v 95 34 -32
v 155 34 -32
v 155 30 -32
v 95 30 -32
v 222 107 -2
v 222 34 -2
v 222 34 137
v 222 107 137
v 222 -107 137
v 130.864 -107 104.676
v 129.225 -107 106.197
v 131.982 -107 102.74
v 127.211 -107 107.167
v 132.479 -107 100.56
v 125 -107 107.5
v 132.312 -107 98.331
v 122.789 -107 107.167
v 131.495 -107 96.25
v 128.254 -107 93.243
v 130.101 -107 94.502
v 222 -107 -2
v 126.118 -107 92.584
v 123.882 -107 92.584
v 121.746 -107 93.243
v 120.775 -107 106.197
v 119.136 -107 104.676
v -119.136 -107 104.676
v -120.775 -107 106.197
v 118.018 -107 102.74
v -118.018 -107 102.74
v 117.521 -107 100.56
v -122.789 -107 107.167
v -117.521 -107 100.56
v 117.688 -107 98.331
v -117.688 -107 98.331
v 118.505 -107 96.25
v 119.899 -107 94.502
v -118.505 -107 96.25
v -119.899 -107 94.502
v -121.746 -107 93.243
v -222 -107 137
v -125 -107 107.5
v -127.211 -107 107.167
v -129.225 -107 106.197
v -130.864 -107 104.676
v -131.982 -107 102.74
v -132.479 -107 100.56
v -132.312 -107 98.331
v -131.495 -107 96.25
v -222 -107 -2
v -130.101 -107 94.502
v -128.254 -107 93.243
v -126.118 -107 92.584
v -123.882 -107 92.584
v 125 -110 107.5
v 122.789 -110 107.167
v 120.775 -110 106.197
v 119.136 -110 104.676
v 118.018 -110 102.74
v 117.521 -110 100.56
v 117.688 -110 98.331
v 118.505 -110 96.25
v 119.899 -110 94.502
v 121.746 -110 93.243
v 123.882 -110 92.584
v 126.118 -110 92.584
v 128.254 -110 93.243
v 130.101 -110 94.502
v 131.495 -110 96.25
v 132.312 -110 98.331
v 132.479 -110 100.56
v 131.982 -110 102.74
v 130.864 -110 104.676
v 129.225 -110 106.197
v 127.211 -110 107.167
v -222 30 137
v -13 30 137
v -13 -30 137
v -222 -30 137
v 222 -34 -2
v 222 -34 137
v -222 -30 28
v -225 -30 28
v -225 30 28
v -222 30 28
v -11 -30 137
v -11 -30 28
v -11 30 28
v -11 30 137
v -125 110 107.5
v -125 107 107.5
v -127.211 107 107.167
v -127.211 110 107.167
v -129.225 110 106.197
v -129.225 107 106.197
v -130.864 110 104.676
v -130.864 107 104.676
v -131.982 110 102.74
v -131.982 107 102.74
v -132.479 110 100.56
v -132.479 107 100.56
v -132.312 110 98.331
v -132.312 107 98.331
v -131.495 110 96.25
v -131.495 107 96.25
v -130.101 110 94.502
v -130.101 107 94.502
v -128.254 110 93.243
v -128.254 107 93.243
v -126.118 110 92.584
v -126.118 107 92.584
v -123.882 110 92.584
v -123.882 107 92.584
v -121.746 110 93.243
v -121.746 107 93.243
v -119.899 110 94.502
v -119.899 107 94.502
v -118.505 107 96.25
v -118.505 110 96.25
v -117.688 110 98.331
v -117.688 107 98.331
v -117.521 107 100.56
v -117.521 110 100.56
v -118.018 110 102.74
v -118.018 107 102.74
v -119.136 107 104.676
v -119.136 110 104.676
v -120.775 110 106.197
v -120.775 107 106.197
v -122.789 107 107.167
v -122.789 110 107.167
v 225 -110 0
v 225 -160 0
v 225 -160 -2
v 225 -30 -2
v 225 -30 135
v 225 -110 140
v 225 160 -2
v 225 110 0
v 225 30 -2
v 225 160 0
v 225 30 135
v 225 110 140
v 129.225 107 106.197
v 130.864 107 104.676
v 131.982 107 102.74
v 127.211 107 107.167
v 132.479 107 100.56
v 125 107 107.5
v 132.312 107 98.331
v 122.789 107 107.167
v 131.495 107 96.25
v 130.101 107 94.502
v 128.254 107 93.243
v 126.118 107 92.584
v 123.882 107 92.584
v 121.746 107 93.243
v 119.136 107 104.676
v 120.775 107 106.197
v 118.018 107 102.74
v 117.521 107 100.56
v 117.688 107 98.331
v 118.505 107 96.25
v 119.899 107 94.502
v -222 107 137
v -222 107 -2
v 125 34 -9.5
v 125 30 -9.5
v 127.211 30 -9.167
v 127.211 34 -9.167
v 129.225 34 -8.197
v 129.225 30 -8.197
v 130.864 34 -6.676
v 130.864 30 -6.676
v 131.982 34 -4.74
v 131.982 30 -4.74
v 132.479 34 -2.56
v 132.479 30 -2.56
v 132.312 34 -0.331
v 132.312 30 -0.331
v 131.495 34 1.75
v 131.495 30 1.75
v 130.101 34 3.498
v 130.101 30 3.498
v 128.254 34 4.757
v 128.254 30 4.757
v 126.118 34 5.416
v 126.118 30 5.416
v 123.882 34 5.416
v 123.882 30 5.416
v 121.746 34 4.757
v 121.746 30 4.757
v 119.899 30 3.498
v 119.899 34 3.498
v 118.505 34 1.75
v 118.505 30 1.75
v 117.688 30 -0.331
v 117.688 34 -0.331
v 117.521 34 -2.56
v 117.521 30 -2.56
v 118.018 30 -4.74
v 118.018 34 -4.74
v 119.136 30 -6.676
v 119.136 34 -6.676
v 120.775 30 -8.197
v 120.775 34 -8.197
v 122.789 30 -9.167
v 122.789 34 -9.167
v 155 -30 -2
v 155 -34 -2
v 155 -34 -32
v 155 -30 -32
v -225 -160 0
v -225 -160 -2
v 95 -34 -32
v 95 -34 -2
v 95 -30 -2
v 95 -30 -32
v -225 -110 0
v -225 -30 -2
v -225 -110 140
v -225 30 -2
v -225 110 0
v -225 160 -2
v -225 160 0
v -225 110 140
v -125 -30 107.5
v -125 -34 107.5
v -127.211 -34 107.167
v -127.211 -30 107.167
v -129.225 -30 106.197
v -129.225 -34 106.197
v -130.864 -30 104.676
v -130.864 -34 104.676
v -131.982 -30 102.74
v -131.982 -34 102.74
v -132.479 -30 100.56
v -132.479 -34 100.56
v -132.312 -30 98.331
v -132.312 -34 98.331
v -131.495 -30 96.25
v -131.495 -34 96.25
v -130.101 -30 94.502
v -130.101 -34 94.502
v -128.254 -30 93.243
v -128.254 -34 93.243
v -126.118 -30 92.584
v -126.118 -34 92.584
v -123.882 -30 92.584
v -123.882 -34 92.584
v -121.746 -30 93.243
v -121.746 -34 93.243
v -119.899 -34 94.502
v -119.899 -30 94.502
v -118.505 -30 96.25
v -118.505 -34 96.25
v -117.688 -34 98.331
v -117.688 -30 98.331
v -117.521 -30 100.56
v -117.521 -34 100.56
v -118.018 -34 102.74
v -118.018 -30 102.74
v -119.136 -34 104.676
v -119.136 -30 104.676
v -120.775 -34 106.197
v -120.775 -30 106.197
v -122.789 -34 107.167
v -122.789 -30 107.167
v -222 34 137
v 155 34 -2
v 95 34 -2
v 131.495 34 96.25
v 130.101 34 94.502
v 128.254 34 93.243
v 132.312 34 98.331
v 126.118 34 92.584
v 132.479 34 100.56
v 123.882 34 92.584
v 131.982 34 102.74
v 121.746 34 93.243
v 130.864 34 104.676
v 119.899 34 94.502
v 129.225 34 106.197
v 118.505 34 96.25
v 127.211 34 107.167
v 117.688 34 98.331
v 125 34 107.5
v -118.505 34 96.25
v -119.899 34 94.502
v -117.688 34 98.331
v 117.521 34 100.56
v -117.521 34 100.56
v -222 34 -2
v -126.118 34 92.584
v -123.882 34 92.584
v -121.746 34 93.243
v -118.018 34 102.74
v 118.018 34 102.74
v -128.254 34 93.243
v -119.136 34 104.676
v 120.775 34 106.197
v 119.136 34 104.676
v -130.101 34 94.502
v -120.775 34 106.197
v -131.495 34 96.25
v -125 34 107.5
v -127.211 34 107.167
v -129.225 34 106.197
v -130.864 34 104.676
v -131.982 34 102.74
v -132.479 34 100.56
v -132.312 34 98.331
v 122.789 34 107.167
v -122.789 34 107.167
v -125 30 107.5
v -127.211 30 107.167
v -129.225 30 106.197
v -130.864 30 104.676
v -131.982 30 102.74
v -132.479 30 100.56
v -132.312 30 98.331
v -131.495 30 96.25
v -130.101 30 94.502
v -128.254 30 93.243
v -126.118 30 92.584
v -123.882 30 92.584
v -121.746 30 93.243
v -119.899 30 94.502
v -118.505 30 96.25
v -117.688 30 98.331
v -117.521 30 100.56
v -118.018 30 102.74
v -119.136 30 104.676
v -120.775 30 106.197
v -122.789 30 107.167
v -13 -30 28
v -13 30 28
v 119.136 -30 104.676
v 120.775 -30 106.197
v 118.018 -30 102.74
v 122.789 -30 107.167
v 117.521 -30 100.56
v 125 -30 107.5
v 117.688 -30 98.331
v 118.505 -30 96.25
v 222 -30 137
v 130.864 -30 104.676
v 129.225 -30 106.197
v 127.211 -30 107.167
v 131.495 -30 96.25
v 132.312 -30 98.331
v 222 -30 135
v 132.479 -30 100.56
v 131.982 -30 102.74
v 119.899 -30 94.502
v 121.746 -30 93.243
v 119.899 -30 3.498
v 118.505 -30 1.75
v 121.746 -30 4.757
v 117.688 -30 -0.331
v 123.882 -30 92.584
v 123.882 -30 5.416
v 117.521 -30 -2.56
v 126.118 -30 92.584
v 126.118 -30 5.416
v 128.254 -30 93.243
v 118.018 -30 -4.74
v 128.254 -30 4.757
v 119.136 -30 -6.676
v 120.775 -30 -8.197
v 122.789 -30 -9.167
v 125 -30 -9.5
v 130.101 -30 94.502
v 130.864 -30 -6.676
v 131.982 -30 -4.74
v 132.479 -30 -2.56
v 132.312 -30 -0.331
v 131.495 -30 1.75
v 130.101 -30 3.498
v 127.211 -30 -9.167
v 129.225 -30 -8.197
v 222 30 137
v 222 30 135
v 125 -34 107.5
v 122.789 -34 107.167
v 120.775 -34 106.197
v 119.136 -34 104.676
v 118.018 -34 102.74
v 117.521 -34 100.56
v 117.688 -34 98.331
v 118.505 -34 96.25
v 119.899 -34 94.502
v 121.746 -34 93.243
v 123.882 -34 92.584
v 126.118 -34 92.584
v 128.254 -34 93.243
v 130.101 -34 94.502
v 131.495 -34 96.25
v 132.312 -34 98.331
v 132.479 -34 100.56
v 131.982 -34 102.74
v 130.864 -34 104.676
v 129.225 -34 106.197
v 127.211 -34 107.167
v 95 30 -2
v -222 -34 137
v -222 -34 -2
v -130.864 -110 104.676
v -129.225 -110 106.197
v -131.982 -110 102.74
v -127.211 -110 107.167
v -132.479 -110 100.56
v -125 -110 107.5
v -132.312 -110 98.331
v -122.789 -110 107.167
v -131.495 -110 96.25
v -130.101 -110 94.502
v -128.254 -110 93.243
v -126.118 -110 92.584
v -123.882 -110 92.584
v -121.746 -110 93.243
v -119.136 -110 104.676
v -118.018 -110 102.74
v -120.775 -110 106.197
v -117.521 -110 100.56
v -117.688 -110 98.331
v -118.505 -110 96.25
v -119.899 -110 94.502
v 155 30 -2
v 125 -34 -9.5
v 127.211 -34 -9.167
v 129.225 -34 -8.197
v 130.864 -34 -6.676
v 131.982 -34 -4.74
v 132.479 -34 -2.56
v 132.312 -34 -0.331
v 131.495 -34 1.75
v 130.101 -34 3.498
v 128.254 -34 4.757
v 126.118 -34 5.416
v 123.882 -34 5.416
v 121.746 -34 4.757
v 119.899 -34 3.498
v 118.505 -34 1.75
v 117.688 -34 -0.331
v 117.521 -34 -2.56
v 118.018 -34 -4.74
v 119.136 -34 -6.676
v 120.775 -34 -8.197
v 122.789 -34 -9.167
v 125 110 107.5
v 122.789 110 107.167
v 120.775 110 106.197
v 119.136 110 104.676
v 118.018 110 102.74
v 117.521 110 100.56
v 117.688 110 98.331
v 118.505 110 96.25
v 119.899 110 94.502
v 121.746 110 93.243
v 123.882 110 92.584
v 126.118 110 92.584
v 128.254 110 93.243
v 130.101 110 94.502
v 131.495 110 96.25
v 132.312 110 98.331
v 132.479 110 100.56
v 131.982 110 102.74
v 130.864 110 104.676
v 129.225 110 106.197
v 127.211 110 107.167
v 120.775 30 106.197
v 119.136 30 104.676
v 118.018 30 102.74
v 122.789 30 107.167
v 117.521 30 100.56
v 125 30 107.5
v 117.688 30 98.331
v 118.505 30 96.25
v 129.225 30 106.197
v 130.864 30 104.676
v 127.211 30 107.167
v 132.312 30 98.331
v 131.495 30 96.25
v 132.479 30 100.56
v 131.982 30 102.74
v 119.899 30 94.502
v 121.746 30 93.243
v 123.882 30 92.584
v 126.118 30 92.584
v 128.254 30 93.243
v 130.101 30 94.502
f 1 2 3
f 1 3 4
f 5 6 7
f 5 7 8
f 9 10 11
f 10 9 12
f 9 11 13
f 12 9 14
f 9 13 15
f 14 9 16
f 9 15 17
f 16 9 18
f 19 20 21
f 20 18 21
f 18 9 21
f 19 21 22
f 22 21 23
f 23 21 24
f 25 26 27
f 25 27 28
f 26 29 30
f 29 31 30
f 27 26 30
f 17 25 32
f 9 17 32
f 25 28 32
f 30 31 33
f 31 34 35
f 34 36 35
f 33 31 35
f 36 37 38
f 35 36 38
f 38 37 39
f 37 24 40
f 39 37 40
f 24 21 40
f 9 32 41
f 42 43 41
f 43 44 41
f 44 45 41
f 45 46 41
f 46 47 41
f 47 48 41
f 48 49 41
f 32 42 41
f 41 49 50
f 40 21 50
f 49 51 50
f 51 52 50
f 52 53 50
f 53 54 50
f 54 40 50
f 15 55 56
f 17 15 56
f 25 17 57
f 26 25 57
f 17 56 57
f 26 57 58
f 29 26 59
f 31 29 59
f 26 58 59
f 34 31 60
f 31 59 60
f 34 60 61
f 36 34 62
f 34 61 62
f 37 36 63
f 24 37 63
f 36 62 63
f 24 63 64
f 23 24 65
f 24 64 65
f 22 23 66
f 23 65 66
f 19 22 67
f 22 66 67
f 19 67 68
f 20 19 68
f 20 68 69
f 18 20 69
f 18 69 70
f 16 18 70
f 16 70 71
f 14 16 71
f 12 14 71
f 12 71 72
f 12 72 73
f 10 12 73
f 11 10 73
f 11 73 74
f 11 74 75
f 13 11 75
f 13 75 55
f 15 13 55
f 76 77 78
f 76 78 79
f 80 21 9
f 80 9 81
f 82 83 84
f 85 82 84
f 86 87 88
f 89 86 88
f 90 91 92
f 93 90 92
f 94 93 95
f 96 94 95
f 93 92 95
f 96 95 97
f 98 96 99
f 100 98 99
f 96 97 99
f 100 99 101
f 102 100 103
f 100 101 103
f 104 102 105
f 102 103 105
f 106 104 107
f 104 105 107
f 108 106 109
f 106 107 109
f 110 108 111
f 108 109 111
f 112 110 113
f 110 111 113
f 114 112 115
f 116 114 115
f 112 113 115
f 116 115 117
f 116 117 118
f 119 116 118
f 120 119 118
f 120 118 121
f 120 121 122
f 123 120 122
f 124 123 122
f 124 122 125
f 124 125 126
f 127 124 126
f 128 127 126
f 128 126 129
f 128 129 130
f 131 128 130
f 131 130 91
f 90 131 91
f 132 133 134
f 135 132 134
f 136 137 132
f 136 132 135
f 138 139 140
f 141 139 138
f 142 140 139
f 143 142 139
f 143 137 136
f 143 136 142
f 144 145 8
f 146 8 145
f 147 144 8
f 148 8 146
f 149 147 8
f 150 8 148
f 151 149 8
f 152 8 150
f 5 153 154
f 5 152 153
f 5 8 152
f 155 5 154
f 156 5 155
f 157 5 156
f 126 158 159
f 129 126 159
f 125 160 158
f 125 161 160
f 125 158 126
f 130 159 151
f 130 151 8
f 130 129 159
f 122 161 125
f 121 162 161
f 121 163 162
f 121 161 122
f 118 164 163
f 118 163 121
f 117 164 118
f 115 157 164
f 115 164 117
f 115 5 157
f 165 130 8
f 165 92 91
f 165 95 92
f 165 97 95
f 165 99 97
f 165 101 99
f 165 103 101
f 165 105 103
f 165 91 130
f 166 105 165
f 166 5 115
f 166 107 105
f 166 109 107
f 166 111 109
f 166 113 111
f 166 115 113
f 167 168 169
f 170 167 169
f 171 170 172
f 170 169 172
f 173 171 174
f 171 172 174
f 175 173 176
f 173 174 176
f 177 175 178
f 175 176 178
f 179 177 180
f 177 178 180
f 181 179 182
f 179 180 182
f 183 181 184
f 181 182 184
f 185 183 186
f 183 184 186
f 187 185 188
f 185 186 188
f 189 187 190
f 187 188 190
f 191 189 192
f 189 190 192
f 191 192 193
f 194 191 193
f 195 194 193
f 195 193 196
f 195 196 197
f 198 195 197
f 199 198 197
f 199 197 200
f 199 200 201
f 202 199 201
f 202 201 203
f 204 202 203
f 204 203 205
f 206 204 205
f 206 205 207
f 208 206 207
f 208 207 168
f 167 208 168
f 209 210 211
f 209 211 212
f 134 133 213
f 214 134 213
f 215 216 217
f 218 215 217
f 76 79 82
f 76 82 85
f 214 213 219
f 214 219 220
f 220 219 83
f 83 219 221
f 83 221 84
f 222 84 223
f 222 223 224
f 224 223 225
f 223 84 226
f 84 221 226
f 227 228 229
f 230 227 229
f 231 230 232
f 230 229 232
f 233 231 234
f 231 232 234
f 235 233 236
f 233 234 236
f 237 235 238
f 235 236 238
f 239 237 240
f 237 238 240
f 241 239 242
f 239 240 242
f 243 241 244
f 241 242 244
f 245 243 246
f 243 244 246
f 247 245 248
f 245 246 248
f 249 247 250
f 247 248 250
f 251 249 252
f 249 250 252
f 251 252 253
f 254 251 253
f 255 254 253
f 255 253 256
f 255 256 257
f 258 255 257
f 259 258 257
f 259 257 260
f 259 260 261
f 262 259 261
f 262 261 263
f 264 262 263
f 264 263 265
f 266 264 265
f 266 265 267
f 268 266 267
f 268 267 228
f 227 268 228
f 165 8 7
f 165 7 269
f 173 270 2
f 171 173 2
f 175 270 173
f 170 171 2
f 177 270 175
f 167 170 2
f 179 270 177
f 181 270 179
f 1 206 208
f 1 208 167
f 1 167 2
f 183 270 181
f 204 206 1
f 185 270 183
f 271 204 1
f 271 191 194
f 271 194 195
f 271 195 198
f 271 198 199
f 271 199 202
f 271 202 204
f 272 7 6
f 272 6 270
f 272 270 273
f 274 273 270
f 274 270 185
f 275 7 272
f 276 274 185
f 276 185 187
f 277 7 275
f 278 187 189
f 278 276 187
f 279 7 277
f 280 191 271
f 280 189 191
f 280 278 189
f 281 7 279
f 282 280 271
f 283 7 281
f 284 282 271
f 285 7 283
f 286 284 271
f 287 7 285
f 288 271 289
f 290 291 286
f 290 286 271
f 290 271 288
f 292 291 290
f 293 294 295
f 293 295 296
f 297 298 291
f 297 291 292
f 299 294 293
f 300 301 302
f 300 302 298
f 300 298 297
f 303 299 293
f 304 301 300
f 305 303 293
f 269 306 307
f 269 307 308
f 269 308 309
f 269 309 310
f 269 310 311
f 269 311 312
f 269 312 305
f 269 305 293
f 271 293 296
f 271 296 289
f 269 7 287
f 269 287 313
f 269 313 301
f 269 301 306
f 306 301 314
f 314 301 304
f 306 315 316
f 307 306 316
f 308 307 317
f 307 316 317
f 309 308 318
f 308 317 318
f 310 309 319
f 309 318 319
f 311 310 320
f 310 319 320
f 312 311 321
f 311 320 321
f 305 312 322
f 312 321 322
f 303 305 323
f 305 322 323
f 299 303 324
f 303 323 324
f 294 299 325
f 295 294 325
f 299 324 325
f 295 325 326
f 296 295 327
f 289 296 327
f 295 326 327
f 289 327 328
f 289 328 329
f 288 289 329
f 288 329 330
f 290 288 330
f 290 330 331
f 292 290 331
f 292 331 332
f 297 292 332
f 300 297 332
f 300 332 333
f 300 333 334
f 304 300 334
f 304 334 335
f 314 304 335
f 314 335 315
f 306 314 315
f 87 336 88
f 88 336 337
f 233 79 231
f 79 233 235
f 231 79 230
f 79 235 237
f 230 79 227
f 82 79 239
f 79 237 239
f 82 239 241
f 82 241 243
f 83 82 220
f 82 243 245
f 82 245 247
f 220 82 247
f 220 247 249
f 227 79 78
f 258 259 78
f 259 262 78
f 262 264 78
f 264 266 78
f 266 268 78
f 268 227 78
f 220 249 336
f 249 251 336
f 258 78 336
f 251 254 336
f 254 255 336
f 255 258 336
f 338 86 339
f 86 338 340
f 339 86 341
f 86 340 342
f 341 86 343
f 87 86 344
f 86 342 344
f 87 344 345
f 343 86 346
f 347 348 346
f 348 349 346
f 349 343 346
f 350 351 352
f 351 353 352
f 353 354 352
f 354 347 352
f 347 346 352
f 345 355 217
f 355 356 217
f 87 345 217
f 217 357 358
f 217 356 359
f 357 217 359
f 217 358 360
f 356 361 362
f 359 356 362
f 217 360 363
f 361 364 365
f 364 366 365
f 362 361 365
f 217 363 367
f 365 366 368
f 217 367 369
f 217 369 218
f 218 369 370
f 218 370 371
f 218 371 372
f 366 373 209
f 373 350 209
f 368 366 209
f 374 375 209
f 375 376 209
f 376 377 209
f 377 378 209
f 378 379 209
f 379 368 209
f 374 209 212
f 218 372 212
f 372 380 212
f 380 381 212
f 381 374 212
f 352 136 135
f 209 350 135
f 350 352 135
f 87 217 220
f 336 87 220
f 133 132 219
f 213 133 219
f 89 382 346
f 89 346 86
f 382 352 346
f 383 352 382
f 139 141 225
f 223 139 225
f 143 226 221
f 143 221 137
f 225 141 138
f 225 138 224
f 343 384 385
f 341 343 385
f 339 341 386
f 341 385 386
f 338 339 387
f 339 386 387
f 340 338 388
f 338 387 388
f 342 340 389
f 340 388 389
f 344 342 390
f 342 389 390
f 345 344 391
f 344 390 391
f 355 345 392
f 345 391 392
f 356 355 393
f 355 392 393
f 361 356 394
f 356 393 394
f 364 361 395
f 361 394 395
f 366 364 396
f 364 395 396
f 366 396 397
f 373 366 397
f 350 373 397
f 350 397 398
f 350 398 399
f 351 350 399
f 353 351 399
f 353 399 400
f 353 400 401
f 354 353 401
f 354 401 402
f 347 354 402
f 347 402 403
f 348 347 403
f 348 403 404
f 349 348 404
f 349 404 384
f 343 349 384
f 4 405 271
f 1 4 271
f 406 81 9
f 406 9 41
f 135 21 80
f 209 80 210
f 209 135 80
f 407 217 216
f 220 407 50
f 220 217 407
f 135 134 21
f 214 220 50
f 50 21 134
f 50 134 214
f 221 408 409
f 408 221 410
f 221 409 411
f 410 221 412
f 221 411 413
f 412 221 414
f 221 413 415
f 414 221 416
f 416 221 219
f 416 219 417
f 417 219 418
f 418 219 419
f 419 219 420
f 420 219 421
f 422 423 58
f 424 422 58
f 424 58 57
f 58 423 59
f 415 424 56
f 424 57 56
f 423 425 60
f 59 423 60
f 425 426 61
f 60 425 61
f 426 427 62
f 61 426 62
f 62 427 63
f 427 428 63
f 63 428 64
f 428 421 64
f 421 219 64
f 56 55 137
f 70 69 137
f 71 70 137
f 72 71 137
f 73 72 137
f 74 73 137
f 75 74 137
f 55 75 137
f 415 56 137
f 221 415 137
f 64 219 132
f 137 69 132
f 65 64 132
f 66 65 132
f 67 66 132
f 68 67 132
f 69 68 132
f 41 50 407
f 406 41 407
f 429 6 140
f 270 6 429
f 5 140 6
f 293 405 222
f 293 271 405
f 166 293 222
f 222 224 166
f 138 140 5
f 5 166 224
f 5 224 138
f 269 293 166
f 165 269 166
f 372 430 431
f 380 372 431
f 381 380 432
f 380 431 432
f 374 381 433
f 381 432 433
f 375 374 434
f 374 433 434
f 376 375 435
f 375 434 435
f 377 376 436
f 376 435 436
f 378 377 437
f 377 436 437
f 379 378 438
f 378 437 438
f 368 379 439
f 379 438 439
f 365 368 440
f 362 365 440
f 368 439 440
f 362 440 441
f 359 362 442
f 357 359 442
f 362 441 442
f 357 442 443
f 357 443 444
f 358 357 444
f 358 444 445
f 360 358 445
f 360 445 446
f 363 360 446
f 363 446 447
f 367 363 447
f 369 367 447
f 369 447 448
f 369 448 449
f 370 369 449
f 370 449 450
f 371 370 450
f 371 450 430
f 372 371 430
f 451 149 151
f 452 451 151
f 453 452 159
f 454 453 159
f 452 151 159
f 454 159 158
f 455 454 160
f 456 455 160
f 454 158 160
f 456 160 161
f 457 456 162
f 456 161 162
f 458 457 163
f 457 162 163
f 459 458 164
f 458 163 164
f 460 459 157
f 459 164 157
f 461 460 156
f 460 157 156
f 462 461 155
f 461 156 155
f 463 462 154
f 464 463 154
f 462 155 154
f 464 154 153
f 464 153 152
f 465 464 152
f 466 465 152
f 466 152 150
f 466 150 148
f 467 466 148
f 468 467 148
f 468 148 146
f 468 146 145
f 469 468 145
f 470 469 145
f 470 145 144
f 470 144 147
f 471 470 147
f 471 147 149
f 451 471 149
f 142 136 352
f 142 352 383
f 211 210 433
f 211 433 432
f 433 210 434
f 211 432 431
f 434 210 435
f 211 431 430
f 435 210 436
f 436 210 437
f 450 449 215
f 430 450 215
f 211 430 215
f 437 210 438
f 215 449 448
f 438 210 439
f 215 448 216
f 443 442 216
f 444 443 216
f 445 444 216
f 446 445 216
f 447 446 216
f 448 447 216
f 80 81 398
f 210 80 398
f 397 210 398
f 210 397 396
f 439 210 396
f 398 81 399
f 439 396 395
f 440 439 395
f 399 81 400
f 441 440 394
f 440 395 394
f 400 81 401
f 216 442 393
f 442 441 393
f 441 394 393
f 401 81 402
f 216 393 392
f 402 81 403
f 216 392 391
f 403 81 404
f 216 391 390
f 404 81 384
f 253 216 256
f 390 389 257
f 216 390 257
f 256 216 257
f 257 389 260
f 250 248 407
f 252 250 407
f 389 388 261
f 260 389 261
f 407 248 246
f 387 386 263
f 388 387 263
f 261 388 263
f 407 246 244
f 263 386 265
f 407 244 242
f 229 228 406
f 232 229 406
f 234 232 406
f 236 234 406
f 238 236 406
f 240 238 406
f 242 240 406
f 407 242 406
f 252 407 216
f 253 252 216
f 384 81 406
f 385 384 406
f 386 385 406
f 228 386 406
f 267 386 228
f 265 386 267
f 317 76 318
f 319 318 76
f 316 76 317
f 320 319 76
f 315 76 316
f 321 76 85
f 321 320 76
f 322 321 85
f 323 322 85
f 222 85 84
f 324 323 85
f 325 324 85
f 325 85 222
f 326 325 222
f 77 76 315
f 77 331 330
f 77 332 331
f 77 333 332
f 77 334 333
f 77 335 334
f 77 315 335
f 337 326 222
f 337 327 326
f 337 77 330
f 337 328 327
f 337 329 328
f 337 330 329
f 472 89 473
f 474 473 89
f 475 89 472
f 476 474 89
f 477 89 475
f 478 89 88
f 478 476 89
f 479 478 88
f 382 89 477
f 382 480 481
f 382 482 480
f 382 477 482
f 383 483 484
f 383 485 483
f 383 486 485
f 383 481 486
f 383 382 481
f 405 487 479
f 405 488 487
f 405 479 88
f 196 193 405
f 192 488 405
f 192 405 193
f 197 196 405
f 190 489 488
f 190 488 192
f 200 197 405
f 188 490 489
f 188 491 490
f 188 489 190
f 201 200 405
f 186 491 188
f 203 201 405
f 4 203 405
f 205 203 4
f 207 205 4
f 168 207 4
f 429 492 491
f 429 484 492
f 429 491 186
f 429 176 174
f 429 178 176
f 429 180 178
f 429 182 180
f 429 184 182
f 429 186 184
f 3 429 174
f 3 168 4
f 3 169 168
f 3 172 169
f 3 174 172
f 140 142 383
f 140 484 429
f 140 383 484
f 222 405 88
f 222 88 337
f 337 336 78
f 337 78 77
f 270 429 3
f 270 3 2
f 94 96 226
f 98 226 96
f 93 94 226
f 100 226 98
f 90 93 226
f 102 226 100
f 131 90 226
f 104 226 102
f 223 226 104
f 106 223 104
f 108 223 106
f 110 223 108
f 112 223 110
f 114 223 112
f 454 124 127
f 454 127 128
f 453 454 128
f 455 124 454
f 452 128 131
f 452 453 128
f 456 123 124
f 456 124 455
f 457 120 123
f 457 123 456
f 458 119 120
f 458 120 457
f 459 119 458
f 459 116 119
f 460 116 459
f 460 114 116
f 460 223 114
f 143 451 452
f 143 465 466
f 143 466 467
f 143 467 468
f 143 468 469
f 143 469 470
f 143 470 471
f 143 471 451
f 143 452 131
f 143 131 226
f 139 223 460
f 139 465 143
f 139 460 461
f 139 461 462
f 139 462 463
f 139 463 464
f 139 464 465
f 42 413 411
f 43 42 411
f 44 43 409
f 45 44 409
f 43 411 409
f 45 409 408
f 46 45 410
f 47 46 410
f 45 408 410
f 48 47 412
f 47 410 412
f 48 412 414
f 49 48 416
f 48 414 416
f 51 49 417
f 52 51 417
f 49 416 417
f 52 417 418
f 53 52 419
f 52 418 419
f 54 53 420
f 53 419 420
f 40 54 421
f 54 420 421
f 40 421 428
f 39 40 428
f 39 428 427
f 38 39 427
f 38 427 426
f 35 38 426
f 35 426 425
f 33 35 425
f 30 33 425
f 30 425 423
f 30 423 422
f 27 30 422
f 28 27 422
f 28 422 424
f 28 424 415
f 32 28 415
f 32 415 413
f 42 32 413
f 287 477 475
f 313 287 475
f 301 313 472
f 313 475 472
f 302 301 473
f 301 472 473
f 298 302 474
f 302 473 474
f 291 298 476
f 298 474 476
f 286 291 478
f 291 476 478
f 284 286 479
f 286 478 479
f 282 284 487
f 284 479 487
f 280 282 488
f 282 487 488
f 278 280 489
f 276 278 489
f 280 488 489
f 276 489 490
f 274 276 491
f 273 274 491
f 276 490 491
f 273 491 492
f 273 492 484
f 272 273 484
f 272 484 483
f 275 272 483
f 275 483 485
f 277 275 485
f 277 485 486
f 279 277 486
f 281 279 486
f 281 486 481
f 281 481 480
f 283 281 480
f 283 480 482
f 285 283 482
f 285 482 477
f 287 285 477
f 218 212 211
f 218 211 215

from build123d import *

# Parameters (mm, degrees)
SKETCH_1_W          = 450
SKETCH_1_H          = 220
EXTRUDE_1_DEPTH     = 140
SKETCH_2_W          = 450
SKETCH_2_H          = 320
EXTRUDE_2_DEPTH     = 2
SKETCH_3_W          = 444
SKETCH_3_H          = 214
CUT_EXTRUDE_1_DEPTH = 139
SKETCH_4_W          = 444
SKETCH_4_H          = 4
EXTRUDE_3_DEPTH     = 139
SKETCH_5_W          = 60
SKETCH_5_H          = 4
EXTRUDE_4_DEPTH     = 30
SKETCH_6_W          = 137
SKETCH_6_H          = 60
CUT_EXTRUDE_2_DEPTH = 10
SKETCH_7_R          = 7.5
CUT_EXTRUDE_3_DEPTH = 70
SKETCH_8_W          = 2
SKETCH_8_H          = 60
EXTRUDE_5_DEPTH     = 139
SKETCH_9_W          = 30
SKETCH_9_H          = 60
CUT_EXTRUDE_4_DEPTH = 240
SKETCH_10_R         = 7.5
CUT_EXTRUDE_5_DEPTH = 220
SKETCH_11_R         = 7.5
CUT_EXTRUDE_6_DEPTH = 220


with BuildPart() as part:
    # 草图1 → 凸台-拉伸1 (new body)
    with BuildSketch(Plane.XY):
        Rectangle(SKETCH_1_W, SKETCH_1_H)
    extrude(amount=EXTRUDE_1_DEPTH)

    # 草图2 → 凸台-拉伸2 (add)
    with BuildSketch(Plane(origin=(0, 0, 0), x_dir=(-1, 0, 0), z_dir=(0, 0, -1))):
        Rectangle(SKETCH_2_W, SKETCH_2_H)
    extrude(amount=EXTRUDE_2_DEPTH)

    # 草图3 → 切除-拉伸1 (cut)
    with BuildSketch(Plane(origin=(0, 0, -2), x_dir=(-1, 0, 0), z_dir=(0, 0, -1))):
        Rectangle(SKETCH_3_W, SKETCH_3_H)
    extrude(amount=-CUT_EXTRUDE_1_DEPTH, mode=Mode.SUBTRACT)

    # 草图4 → 凸台-拉伸3 (add)
    with BuildSketch(Plane(origin=(0, 0, 137), x_dir=(-1, 0, 0), z_dir=(0, 0, -1))):
        with Locations((0, -32)):
            Rectangle(SKETCH_4_W, SKETCH_4_H)
        with Locations((0, 32)):
            Rectangle(SKETCH_4_W, SKETCH_4_H)
    extrude(amount=EXTRUDE_3_DEPTH)

    # 草图5 → 凸台-拉伸4 (add)
    with BuildSketch(Plane(origin=(0, 0, -2), x_dir=(-1, 0, 0), z_dir=(0, 0, -1))):
        with Locations((-125, 32)):
            Rectangle(SKETCH_5_W, SKETCH_5_H)
        with Locations((-125, -32)):
            Rectangle(SKETCH_5_W, SKETCH_5_H)
    extrude(amount=EXTRUDE_4_DEPTH)

    # 草图6 → 切除-拉伸2 (cut)
    with BuildSketch(Plane(origin=(225, 0, 0), x_dir=(0, 0, -1), z_dir=(1, 0, 0))):
        with Locations((-66.5, 0)):
            Rectangle(SKETCH_6_W, SKETCH_6_H)
    extrude(amount=-CUT_EXTRUDE_2_DEPTH, mode=Mode.SUBTRACT)

    # 草图7 → 切除-拉伸3 (cut)
    with BuildSketch(Plane.XZ.offset(34)):
        with Locations(Location((125, -2, 0), (0, 0, 270))):
            Circle(SKETCH_7_R)
    extrude(amount=-CUT_EXTRUDE_3_DEPTH, mode=Mode.SUBTRACT)

    # 草图8 → 凸台-拉伸5 (add)
    with BuildSketch(Plane(origin=(0, 0, 137), x_dir=(-1, 0, 0), z_dir=(0, 0, -1))):
        with Locations((12, 0)):
            Rectangle(SKETCH_8_W, SKETCH_8_H)
    extrude(amount=EXTRUDE_5_DEPTH)

    # 草图9 → 切除-拉伸4 (cut)
    with BuildSketch(Plane.ZY.offset(225)):
        with Locations((13, 0)):
            Rectangle(SKETCH_9_W, SKETCH_9_H)
    extrude(amount=-CUT_EXTRUDE_4_DEPTH, mode=Mode.SUBTRACT)

    # 草图10 → 切除-拉伸5 (cut)
    with BuildSketch(Plane.XZ.offset(110)):
        with Locations(Location((125, 100, 0), (0, 0, 90))):
            Circle(SKETCH_10_R)
    extrude(amount=-CUT_EXTRUDE_5_DEPTH, mode=Mode.SUBTRACT)

    # 草图11 → 切除-拉伸6 (cut)
    with BuildSketch(Plane.XZ.offset(110)):
        with Locations(Location((-125, 100, 0), (0, 0, 90))):
            Circle(SKETCH_11_R)
    extrude(amount=-CUT_EXTRUDE_6_DEPTH, mode=Mode.SUBTRACT)


solid = part.part
